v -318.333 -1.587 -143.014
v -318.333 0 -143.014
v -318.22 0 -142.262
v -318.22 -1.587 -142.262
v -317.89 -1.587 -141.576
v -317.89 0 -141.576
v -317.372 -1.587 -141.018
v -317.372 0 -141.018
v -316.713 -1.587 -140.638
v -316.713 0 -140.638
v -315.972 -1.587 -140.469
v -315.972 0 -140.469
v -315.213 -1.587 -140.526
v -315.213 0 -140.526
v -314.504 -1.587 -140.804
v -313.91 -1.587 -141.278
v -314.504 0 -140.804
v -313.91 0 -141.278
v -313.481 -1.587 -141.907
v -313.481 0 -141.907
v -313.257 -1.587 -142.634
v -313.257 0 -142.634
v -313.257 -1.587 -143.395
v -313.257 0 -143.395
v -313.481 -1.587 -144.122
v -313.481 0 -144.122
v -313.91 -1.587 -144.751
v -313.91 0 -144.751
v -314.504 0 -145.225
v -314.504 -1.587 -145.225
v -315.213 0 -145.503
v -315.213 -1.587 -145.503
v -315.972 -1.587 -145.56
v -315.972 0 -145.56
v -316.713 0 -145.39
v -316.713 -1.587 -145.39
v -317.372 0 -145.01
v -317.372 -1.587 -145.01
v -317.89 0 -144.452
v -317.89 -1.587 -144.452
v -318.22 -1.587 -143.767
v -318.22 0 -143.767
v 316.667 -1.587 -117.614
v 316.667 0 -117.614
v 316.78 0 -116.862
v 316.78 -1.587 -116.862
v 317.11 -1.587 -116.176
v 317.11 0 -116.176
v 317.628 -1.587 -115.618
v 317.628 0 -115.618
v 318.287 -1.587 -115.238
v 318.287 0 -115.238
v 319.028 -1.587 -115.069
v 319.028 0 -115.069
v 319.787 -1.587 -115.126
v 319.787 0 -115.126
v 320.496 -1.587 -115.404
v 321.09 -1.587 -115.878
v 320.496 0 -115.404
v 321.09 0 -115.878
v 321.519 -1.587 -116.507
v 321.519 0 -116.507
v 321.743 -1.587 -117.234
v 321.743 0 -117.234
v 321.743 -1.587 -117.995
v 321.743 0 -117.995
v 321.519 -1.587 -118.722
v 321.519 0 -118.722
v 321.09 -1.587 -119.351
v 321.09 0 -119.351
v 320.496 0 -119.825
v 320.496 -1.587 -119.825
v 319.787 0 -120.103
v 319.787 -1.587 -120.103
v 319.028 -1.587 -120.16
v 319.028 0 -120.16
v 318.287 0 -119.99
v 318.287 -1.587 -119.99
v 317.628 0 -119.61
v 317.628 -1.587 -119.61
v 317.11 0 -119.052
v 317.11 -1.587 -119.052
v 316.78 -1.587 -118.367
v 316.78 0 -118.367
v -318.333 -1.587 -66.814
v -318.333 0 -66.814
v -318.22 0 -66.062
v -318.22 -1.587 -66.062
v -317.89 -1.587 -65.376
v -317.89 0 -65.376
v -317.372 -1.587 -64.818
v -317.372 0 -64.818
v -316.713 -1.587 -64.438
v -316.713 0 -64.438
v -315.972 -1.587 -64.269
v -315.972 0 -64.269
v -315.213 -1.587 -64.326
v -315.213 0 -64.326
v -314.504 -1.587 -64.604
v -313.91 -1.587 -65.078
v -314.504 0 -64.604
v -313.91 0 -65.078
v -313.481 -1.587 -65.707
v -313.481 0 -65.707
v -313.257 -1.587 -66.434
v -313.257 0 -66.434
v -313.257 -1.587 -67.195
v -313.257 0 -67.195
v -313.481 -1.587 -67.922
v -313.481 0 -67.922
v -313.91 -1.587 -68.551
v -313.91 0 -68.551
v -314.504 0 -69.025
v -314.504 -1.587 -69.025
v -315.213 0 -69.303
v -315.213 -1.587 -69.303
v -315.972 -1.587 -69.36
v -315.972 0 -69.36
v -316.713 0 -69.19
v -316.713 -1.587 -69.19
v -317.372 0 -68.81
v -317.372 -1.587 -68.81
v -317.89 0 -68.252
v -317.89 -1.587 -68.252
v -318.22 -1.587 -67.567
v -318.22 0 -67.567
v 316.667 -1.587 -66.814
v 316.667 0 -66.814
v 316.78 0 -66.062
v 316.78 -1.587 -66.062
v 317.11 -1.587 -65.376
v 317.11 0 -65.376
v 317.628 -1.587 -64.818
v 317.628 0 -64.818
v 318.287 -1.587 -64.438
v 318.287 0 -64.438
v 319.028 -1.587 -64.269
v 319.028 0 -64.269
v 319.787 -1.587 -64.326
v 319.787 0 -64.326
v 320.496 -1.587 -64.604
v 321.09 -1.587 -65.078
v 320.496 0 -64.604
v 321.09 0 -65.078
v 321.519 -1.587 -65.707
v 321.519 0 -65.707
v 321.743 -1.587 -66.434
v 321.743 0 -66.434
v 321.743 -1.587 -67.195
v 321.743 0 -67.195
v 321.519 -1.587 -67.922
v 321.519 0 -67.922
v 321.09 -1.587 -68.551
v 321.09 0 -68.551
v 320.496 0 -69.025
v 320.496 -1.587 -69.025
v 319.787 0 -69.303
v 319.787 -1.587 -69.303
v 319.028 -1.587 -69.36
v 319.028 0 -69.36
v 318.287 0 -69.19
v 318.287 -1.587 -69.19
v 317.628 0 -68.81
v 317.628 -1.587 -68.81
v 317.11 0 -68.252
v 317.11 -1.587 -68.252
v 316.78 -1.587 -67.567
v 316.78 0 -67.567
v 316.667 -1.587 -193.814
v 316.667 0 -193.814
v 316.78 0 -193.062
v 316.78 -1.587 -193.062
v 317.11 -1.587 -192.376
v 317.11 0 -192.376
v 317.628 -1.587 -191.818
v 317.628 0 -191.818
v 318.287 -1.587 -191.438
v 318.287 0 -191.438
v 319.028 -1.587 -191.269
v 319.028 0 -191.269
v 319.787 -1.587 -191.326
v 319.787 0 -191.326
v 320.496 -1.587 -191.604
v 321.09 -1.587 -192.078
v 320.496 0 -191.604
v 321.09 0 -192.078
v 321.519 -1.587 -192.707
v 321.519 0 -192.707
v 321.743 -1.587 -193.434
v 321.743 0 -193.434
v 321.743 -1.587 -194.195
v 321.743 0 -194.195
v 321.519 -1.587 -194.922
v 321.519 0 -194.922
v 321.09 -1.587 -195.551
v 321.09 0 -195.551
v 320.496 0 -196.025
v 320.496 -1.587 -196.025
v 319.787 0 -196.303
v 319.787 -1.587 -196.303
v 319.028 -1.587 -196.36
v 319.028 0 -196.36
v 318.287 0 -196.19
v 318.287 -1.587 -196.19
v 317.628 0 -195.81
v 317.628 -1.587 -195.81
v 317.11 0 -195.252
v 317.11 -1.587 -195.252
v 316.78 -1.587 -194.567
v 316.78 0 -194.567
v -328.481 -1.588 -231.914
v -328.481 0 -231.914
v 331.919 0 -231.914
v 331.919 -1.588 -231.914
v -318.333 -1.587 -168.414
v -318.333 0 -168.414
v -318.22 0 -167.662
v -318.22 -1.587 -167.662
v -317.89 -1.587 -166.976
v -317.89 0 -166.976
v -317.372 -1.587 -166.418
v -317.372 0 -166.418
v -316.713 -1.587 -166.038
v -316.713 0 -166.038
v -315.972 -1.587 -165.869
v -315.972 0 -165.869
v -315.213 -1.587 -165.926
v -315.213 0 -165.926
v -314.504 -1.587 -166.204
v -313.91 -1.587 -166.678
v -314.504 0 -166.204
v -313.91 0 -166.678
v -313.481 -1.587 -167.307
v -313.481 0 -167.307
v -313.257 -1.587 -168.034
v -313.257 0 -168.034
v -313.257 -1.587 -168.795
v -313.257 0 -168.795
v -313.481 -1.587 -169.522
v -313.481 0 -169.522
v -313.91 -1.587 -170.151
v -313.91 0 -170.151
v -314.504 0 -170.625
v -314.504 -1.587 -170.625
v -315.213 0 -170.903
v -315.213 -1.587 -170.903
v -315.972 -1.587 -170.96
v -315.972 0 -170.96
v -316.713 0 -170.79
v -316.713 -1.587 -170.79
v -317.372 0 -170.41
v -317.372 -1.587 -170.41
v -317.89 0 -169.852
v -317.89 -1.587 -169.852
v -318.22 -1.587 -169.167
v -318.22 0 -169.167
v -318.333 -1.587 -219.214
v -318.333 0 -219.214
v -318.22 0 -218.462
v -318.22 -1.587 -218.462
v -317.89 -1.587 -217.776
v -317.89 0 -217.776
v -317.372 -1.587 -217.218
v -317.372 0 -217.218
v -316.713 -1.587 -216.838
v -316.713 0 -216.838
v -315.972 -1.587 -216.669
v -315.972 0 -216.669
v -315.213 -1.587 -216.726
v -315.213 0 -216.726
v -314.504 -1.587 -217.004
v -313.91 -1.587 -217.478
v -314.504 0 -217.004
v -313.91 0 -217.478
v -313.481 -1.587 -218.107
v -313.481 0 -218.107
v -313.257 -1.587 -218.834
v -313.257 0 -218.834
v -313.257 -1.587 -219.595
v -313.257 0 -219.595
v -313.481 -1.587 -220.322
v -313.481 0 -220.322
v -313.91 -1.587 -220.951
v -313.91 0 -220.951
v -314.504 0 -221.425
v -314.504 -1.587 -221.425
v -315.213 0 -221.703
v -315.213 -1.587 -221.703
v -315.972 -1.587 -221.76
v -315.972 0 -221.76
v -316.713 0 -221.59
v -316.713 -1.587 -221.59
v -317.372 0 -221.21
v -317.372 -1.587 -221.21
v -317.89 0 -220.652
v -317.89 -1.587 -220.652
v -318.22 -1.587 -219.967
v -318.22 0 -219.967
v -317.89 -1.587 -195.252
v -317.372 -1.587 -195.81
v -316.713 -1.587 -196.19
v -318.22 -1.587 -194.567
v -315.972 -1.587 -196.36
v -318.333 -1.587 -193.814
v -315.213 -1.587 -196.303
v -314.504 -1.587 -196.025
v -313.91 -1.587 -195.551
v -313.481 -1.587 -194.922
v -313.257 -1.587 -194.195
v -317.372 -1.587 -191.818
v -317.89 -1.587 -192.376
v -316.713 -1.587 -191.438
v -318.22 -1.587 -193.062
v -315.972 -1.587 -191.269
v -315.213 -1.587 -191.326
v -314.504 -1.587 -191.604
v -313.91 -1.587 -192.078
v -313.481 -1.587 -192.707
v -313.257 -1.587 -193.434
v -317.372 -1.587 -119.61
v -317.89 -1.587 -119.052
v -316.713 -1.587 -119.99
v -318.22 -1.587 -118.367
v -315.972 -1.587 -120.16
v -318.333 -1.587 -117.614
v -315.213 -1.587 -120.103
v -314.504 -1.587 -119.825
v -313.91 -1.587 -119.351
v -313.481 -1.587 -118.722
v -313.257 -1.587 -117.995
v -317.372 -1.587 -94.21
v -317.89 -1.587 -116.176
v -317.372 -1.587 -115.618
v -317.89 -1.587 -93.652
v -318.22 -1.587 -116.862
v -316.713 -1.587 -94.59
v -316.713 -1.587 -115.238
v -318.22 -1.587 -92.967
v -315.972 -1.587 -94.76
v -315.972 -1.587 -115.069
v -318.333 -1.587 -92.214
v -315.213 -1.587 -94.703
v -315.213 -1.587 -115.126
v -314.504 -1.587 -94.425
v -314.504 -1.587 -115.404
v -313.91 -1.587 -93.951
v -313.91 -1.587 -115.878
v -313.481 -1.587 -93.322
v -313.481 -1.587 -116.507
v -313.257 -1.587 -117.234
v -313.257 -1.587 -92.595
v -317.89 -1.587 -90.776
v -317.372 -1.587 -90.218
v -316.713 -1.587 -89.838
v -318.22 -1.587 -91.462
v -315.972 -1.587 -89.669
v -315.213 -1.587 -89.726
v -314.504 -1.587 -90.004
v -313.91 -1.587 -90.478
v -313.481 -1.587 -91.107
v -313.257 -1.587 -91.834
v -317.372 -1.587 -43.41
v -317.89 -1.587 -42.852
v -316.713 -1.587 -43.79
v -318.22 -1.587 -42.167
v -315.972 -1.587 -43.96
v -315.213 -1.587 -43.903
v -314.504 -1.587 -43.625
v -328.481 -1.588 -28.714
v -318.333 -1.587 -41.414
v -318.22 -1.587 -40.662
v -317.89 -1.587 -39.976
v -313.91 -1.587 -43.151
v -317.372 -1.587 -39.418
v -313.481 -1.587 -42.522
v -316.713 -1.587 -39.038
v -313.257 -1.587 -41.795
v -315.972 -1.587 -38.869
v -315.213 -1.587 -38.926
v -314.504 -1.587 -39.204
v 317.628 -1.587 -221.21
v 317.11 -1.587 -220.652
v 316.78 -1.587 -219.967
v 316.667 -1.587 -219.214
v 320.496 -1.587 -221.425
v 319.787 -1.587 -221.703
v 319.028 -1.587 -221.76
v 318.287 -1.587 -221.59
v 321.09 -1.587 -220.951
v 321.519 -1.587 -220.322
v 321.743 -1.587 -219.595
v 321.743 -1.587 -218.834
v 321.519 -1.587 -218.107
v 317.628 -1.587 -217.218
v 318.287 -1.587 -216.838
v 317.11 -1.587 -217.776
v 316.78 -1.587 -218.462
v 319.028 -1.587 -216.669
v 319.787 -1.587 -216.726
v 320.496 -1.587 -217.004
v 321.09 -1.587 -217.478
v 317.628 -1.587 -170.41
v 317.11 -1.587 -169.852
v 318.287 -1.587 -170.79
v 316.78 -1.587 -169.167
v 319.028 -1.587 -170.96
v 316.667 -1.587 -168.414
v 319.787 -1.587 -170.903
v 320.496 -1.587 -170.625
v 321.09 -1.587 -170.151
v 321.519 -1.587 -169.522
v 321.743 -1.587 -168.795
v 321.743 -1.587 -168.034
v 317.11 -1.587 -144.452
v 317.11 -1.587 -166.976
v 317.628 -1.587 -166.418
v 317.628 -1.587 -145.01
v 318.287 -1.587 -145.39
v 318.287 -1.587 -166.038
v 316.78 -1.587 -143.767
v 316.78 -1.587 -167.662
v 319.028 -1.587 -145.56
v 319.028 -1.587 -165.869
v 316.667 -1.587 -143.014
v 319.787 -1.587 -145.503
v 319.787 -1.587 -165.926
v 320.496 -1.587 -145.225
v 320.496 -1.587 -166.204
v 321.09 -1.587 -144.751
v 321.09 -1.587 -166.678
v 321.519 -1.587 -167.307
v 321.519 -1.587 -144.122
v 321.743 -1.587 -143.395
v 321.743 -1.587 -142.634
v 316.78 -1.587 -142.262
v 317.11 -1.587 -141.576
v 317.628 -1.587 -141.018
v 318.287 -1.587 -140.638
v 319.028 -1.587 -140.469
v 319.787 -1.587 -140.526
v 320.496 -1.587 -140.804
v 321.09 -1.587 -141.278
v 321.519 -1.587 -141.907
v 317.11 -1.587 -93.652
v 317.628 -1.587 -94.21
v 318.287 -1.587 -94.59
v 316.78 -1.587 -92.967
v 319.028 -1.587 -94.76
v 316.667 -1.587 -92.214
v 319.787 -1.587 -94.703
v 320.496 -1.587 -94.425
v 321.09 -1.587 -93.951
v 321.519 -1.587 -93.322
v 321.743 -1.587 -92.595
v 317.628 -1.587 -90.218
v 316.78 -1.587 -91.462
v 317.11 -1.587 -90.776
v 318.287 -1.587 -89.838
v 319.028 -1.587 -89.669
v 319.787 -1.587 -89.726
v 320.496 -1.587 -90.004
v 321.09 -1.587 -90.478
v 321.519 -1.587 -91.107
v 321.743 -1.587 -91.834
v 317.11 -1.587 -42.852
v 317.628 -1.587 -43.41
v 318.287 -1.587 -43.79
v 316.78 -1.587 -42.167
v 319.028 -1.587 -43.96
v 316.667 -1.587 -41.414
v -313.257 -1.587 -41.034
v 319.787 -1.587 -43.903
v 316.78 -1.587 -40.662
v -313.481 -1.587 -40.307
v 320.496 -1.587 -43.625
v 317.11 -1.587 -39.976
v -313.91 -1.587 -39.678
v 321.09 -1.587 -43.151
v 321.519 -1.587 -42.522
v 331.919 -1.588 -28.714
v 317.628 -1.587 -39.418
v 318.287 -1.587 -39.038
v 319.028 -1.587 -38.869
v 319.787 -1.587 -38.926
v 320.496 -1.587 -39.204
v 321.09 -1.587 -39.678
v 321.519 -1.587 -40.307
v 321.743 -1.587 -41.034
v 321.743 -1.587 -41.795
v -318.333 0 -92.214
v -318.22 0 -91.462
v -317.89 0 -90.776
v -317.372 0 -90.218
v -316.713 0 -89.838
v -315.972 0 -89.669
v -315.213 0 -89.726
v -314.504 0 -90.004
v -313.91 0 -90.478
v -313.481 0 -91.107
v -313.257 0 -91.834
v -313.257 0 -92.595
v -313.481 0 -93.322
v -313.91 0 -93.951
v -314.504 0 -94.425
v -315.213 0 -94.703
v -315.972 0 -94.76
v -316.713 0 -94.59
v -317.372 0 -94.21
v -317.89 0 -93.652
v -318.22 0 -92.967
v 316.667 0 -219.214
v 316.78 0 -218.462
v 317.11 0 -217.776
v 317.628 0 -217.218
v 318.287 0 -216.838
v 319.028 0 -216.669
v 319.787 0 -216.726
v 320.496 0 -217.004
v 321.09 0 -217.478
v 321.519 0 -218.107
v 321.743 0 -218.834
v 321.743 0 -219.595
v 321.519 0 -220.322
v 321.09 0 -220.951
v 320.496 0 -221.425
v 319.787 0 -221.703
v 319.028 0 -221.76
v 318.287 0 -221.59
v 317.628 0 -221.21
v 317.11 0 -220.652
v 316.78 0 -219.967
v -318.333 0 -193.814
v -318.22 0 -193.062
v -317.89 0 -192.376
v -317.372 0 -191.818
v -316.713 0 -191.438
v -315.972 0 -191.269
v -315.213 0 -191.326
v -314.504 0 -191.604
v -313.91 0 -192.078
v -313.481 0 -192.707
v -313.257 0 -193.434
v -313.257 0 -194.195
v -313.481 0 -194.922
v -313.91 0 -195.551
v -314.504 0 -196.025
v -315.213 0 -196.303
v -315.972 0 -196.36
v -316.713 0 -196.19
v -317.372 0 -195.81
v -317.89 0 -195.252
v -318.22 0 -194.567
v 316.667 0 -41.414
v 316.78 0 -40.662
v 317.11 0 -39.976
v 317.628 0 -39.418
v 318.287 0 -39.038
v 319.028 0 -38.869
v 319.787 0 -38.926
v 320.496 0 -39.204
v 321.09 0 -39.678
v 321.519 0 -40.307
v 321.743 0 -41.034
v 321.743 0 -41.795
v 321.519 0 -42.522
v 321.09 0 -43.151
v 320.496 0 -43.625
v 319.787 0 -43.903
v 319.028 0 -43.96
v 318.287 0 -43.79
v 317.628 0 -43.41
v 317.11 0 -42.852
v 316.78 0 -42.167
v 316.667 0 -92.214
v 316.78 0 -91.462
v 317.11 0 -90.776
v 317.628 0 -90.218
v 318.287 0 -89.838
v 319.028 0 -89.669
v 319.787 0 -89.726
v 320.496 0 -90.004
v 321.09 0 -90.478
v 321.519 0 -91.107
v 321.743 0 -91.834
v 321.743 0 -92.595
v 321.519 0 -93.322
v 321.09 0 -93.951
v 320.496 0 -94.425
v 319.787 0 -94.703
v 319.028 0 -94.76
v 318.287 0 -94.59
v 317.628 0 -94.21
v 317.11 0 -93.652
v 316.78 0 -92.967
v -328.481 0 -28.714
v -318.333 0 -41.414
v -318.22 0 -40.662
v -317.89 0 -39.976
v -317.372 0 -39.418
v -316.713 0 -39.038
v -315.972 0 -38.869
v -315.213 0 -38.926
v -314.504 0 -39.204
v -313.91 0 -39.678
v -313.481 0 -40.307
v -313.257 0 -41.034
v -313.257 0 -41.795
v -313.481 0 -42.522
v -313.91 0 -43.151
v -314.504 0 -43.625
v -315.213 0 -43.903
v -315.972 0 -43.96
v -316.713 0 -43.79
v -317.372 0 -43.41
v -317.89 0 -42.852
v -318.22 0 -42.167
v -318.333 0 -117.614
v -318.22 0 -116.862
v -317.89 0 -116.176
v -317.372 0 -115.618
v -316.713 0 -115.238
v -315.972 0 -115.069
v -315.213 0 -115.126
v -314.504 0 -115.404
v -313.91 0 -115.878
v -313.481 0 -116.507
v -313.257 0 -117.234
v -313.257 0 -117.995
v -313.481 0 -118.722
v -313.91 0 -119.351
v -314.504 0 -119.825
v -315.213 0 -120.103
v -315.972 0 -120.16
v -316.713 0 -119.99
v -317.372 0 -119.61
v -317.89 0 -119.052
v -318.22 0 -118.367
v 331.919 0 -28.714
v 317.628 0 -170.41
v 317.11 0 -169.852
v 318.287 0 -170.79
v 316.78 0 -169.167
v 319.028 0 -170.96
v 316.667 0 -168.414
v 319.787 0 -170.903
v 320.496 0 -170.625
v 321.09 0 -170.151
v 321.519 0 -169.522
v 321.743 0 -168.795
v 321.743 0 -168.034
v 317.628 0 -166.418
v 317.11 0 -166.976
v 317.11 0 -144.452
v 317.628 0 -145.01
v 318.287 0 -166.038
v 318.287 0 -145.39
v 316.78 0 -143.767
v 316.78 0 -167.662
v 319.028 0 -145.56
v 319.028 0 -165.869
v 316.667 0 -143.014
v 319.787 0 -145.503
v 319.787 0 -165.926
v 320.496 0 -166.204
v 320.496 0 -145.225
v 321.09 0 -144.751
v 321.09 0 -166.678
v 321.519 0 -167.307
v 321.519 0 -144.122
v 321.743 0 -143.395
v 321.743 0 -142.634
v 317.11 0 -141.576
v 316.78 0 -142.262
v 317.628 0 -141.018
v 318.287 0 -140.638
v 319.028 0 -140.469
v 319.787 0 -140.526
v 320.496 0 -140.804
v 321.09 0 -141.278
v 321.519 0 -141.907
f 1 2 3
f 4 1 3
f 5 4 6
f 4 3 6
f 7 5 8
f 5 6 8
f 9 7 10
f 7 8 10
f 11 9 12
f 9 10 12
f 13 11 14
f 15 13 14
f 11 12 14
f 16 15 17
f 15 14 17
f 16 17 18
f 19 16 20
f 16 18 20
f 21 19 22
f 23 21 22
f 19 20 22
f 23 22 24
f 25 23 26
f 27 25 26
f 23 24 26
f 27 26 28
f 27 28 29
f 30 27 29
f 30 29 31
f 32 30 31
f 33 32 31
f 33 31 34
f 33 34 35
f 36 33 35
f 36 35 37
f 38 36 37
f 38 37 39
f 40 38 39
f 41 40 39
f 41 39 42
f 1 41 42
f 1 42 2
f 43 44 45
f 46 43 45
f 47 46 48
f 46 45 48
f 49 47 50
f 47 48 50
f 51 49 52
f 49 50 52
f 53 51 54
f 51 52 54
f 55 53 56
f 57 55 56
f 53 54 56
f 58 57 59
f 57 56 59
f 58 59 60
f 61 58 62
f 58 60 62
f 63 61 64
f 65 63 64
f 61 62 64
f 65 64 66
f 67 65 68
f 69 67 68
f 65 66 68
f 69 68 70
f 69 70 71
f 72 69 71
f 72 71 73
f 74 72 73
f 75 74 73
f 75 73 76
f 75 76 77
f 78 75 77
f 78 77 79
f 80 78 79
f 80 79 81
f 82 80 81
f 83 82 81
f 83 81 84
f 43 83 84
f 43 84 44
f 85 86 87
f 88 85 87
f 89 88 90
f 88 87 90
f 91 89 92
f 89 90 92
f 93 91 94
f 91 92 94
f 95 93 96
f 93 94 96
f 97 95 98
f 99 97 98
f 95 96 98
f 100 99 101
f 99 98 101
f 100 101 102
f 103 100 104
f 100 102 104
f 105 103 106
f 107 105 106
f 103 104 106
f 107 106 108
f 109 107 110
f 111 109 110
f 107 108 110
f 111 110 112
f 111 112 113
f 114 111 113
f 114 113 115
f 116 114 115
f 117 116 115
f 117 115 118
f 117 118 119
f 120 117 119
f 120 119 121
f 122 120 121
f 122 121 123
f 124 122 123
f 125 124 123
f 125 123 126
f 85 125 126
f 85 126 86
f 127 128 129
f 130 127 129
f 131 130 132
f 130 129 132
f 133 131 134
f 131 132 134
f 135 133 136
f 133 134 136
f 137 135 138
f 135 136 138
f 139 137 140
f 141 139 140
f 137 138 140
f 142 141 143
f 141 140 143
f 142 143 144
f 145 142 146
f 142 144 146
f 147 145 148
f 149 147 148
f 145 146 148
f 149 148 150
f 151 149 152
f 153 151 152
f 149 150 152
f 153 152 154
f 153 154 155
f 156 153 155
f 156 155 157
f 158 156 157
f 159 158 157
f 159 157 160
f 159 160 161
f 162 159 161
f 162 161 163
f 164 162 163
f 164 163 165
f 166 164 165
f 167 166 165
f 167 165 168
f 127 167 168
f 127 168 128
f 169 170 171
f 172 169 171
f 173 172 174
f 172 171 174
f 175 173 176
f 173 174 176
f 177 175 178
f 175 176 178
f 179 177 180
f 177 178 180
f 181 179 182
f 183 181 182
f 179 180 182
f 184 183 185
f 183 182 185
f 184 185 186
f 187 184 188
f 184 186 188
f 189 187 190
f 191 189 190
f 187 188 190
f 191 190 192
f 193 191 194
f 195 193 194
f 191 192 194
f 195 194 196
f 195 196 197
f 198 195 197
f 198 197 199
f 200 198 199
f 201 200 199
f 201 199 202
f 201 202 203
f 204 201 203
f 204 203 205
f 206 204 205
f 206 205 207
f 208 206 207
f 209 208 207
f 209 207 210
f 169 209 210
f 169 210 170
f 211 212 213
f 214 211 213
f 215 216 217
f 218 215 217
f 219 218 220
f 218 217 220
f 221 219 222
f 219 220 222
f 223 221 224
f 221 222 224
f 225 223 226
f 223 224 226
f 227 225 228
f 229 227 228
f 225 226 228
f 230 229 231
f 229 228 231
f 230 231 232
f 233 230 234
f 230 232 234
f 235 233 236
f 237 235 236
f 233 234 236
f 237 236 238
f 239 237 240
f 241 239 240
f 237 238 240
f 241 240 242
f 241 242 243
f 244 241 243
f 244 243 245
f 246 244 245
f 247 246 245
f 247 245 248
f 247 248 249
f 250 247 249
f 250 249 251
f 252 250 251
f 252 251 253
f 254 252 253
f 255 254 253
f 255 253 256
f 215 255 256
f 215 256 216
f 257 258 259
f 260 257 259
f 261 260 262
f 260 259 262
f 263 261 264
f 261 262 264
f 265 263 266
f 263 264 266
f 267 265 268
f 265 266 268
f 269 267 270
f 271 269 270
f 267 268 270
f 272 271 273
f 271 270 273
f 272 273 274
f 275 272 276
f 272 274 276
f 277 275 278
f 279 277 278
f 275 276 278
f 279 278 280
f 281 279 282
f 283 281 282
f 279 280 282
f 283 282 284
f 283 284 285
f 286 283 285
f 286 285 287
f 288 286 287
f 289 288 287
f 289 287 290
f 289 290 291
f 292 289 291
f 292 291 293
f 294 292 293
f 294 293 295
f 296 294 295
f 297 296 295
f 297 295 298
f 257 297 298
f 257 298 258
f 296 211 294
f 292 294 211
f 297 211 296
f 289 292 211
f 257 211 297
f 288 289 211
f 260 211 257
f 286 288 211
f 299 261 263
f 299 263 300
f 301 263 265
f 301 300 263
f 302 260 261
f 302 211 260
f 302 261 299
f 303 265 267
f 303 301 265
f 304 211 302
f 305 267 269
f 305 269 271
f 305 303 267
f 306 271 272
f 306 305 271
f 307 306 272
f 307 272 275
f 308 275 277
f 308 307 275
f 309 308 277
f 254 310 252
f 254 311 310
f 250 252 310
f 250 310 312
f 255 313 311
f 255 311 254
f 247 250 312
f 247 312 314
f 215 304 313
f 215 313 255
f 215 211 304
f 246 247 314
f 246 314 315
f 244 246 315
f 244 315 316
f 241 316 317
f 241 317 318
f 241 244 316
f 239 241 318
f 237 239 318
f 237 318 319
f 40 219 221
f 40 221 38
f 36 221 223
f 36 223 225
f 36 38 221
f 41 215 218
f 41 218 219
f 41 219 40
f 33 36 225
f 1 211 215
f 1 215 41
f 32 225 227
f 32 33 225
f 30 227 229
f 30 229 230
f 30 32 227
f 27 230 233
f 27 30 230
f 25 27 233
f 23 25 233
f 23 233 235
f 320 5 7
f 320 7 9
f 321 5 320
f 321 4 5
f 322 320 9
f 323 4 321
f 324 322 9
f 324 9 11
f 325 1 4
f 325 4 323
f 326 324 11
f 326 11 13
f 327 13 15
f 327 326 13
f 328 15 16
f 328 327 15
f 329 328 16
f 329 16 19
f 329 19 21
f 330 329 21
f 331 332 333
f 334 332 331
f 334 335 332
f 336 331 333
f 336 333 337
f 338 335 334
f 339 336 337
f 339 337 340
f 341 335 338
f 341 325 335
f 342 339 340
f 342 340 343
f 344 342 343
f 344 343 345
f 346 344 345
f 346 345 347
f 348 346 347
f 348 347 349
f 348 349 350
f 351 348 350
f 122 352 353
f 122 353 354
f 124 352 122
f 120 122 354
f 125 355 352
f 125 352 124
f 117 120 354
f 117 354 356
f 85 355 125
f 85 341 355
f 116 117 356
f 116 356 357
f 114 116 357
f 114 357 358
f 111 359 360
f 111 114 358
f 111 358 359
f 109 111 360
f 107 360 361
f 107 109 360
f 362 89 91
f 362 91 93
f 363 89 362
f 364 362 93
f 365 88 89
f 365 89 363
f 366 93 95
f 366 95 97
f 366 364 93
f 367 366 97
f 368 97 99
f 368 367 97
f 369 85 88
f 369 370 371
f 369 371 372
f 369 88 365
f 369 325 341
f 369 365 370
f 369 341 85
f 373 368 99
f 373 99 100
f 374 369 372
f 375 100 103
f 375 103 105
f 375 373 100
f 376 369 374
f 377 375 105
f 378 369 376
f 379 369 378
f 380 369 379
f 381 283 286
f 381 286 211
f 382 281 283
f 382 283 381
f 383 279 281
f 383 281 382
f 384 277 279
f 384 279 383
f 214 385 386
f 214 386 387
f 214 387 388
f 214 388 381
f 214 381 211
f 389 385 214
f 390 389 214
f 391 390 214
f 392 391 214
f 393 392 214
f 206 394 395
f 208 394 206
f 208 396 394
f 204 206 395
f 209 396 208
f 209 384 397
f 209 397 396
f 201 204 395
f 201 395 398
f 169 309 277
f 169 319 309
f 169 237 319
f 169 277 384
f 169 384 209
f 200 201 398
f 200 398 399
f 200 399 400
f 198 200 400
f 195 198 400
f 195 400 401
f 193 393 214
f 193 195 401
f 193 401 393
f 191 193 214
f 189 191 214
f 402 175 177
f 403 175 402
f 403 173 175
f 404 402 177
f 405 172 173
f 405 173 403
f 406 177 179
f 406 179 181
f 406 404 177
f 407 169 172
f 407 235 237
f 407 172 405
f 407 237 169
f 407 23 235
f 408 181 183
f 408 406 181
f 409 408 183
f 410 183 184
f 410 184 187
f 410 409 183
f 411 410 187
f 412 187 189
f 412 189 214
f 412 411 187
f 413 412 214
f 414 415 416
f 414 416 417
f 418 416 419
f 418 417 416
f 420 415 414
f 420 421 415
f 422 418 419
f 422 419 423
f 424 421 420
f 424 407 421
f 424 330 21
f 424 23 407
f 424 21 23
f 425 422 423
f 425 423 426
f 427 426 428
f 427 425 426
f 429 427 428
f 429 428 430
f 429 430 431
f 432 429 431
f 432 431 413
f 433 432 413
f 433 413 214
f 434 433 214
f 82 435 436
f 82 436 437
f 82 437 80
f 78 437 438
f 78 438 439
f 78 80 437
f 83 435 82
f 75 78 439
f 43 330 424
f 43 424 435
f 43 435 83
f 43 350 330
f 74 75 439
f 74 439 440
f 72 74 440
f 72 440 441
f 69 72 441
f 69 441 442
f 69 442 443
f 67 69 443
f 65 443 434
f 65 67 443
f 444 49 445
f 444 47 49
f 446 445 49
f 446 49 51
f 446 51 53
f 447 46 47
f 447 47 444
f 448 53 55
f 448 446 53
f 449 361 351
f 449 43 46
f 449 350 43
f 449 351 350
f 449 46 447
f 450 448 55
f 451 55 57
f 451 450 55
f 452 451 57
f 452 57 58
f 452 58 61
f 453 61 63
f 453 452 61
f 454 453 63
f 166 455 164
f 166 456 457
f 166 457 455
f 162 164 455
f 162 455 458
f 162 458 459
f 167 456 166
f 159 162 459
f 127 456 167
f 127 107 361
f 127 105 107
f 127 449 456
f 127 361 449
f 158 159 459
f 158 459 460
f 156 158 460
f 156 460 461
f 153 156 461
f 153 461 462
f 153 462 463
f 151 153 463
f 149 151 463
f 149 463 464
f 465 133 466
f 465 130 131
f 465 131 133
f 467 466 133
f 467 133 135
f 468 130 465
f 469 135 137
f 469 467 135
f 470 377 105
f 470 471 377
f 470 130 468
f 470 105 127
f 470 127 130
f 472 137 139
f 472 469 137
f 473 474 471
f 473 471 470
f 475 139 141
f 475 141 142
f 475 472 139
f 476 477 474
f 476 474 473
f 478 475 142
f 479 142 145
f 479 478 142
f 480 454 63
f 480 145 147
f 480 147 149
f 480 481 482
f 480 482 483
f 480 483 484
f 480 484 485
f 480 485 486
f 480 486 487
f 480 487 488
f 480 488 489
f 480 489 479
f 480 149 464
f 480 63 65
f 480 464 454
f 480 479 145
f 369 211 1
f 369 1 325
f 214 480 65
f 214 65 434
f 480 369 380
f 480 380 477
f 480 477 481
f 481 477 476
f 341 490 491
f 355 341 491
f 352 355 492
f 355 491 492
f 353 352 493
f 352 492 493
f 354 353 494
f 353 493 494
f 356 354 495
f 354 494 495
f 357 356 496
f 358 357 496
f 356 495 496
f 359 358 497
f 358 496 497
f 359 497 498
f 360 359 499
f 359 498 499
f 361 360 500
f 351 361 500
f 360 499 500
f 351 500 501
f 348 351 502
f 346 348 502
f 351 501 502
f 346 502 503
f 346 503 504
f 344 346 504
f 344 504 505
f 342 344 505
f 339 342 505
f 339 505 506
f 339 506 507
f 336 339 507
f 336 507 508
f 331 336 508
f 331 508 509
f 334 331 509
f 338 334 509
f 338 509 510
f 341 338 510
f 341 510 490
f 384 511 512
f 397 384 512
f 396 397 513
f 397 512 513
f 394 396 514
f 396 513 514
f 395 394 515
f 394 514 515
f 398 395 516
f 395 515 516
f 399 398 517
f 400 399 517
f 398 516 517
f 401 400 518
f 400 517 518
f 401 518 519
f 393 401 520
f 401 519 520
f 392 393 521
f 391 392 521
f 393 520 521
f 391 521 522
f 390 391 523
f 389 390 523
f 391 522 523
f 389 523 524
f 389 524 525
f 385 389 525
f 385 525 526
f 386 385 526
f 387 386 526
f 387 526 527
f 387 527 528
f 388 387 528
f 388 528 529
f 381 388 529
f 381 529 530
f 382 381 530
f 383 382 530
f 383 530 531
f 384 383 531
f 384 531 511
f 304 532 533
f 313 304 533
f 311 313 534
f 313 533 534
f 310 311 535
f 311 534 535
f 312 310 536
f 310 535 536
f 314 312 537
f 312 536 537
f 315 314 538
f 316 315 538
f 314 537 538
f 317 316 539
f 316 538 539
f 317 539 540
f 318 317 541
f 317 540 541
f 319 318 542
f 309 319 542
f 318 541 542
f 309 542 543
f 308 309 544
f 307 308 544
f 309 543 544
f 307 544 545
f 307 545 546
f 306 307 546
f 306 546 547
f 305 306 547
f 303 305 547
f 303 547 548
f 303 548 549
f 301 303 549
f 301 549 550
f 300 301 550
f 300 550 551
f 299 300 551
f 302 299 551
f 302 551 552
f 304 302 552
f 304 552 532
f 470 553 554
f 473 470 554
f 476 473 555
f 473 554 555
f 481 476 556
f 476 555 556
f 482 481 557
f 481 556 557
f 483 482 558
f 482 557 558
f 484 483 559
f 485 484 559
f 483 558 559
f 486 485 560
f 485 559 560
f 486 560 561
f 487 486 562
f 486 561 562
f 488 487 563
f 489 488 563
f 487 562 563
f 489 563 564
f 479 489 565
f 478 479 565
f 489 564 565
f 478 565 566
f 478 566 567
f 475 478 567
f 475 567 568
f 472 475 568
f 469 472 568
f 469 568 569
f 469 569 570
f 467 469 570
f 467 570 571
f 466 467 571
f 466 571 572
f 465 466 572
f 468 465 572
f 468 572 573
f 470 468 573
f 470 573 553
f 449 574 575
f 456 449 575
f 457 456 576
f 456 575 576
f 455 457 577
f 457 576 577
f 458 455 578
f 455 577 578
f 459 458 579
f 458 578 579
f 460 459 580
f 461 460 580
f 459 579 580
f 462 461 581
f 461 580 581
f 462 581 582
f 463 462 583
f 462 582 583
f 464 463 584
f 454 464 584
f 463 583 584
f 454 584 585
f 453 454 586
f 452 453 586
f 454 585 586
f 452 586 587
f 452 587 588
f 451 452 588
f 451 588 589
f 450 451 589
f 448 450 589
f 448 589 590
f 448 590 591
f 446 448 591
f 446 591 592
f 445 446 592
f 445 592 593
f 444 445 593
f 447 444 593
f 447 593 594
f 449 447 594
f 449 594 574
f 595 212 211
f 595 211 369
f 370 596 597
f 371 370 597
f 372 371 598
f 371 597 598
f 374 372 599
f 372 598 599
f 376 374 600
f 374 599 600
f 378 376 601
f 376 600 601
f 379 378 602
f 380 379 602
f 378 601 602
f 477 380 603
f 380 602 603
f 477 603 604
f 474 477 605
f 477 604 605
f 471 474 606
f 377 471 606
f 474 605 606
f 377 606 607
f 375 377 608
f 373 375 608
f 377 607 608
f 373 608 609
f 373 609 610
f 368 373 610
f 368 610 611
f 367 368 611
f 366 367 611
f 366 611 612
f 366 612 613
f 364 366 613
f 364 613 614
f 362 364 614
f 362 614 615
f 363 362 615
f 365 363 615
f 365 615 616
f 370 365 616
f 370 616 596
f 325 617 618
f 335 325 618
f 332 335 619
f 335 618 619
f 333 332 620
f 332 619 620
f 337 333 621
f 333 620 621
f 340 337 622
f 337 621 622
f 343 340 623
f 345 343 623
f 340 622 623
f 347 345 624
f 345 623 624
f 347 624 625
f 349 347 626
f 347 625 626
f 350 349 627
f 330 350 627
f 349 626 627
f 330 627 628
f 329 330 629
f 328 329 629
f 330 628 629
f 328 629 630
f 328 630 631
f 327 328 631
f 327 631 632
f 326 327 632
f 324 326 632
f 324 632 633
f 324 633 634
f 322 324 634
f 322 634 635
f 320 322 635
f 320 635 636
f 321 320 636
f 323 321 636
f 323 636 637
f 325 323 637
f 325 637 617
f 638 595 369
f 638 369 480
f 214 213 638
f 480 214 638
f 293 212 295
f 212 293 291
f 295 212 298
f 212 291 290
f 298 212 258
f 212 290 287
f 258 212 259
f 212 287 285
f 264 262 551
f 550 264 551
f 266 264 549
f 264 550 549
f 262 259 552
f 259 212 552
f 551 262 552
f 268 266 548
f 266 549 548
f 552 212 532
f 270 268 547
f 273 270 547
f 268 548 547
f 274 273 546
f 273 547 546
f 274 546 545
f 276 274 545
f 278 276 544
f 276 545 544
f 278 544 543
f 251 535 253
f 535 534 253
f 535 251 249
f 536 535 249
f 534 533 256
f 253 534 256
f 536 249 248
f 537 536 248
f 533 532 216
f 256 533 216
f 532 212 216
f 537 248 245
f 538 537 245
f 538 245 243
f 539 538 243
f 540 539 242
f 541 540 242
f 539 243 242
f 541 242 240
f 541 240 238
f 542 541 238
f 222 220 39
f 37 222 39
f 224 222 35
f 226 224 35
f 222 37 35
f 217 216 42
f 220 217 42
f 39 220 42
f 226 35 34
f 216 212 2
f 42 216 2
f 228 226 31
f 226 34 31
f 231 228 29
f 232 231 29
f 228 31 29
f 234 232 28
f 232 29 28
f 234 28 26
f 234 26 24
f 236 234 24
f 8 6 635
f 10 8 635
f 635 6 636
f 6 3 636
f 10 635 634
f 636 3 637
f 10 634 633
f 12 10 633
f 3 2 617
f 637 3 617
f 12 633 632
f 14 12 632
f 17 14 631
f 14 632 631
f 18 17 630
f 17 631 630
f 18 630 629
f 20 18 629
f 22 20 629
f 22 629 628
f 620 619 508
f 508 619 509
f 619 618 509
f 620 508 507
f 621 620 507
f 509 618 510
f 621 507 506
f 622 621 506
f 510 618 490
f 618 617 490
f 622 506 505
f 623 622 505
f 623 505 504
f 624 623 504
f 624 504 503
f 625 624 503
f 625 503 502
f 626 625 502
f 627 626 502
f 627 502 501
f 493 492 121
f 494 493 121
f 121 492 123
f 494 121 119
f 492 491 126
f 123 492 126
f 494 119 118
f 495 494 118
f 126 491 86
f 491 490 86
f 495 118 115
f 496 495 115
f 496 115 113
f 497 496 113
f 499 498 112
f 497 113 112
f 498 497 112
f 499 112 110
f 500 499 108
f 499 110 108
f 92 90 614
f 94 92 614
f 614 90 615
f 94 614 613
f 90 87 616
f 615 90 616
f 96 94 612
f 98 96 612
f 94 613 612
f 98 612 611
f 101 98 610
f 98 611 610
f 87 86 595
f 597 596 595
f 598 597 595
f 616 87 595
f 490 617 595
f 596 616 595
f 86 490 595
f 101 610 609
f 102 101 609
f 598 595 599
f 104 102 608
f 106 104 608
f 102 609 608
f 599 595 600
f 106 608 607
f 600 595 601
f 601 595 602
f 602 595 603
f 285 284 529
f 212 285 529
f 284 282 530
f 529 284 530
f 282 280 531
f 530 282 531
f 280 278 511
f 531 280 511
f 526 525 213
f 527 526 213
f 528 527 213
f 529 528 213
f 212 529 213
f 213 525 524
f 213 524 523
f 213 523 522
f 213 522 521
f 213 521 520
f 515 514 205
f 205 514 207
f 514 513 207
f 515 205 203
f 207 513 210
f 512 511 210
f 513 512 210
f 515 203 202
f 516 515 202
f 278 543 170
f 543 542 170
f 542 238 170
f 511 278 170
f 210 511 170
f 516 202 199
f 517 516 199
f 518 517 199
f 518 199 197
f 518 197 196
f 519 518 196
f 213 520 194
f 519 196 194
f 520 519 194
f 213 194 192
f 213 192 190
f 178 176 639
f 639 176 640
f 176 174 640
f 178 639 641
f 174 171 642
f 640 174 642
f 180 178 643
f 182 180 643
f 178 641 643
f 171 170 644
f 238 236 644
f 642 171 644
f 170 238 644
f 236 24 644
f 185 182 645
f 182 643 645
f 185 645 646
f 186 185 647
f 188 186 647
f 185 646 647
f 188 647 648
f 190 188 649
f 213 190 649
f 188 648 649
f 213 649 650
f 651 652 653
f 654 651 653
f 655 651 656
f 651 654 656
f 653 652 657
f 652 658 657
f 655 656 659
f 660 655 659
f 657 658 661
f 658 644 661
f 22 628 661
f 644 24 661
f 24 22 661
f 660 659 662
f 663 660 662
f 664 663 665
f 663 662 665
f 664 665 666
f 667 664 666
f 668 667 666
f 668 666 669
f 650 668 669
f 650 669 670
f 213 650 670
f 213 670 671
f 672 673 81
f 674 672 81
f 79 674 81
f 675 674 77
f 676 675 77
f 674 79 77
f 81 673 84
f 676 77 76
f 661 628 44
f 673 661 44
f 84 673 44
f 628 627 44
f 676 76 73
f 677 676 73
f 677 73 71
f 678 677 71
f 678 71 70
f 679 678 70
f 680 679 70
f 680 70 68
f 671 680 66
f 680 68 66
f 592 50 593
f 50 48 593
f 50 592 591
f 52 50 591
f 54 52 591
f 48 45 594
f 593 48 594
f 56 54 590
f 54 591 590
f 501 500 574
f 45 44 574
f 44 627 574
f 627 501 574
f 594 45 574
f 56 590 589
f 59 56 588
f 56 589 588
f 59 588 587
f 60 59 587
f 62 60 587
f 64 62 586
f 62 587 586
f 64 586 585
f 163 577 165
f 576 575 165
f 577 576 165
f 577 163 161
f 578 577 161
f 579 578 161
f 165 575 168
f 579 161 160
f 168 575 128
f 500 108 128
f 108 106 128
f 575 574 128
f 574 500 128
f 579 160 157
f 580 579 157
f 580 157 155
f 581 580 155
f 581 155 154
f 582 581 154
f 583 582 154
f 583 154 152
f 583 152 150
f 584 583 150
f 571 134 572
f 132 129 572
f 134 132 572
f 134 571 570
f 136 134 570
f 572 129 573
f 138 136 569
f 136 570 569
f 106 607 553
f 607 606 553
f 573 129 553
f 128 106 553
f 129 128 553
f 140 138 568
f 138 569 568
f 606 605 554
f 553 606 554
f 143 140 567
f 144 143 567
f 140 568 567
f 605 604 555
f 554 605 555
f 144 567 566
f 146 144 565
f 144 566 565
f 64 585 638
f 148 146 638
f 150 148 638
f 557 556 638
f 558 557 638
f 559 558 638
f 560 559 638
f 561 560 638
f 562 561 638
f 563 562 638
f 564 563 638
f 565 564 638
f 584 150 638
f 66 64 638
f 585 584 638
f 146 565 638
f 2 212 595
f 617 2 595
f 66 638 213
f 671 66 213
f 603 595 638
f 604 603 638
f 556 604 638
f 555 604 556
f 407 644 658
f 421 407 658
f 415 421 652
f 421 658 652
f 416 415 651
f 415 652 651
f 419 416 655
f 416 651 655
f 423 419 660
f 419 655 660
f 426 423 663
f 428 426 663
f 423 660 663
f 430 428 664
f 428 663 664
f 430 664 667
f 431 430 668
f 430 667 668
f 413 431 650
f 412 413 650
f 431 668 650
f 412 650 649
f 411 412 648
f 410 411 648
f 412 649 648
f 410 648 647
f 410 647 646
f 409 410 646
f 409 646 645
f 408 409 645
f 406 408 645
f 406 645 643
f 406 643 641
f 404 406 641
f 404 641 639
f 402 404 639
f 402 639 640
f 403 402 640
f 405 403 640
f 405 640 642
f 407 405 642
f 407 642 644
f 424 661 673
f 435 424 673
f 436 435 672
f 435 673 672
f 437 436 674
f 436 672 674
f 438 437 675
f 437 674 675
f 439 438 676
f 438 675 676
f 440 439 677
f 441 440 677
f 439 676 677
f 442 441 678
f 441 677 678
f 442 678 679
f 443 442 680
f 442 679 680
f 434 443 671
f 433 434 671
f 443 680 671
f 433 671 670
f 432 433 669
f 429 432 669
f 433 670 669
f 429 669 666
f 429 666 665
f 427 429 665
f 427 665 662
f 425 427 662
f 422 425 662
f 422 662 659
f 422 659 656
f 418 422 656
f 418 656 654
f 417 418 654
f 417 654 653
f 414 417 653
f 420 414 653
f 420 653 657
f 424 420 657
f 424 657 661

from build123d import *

# Parameters (mm, degrees)
F0_W     = 660.4
F0_H     = 203.2
F1_DEPTH = 1.5875
F3_D     = 5.1054


# Not quite as in the source:
# - a length typed as a fraction of an inch, garbled in the dataset ("3 / 203.2 mm" for 3/8 in), is restored


with BuildPart() as f1:
    # F0 (on Front) → F1 (new body)
    with BuildSketch(Plane.XZ):
        with Locations((1.7192233354, -130.3142405412)):
            Rectangle(F0_W, F0_H)
    extrude(amount=F1_DEPTH)

    # F3 (through all)
    with Locations(Plane.XZ.offset(1.5875)):
        with Locations((-315.7807766646, -92.2142405412), (-315.7807766646, -117.6142405412), (-315.7807766646, -143.0142405412), (319.2192233354, -219.2142405412), (319.2192233354, -168.4142405412), (319.2192233354, -117.6142405412), (319.2192233354, -66.8142405412), (319.2192233354, -193.8142405412), (319.2192233354, -143.0142405412), (-315.7807766646, -168.4142405412), (319.2192233354, -92.2142405412), (-315.7807766646, -193.8142405412), (-315.7807766646, -219.2142405412), (-315.7807766646, -41.4142405412), (-315.7807766646, -66.8142405412), (319.2192233354, -41.4142405412)):
            Hole(F3_D / 2)


solid = f1.part
